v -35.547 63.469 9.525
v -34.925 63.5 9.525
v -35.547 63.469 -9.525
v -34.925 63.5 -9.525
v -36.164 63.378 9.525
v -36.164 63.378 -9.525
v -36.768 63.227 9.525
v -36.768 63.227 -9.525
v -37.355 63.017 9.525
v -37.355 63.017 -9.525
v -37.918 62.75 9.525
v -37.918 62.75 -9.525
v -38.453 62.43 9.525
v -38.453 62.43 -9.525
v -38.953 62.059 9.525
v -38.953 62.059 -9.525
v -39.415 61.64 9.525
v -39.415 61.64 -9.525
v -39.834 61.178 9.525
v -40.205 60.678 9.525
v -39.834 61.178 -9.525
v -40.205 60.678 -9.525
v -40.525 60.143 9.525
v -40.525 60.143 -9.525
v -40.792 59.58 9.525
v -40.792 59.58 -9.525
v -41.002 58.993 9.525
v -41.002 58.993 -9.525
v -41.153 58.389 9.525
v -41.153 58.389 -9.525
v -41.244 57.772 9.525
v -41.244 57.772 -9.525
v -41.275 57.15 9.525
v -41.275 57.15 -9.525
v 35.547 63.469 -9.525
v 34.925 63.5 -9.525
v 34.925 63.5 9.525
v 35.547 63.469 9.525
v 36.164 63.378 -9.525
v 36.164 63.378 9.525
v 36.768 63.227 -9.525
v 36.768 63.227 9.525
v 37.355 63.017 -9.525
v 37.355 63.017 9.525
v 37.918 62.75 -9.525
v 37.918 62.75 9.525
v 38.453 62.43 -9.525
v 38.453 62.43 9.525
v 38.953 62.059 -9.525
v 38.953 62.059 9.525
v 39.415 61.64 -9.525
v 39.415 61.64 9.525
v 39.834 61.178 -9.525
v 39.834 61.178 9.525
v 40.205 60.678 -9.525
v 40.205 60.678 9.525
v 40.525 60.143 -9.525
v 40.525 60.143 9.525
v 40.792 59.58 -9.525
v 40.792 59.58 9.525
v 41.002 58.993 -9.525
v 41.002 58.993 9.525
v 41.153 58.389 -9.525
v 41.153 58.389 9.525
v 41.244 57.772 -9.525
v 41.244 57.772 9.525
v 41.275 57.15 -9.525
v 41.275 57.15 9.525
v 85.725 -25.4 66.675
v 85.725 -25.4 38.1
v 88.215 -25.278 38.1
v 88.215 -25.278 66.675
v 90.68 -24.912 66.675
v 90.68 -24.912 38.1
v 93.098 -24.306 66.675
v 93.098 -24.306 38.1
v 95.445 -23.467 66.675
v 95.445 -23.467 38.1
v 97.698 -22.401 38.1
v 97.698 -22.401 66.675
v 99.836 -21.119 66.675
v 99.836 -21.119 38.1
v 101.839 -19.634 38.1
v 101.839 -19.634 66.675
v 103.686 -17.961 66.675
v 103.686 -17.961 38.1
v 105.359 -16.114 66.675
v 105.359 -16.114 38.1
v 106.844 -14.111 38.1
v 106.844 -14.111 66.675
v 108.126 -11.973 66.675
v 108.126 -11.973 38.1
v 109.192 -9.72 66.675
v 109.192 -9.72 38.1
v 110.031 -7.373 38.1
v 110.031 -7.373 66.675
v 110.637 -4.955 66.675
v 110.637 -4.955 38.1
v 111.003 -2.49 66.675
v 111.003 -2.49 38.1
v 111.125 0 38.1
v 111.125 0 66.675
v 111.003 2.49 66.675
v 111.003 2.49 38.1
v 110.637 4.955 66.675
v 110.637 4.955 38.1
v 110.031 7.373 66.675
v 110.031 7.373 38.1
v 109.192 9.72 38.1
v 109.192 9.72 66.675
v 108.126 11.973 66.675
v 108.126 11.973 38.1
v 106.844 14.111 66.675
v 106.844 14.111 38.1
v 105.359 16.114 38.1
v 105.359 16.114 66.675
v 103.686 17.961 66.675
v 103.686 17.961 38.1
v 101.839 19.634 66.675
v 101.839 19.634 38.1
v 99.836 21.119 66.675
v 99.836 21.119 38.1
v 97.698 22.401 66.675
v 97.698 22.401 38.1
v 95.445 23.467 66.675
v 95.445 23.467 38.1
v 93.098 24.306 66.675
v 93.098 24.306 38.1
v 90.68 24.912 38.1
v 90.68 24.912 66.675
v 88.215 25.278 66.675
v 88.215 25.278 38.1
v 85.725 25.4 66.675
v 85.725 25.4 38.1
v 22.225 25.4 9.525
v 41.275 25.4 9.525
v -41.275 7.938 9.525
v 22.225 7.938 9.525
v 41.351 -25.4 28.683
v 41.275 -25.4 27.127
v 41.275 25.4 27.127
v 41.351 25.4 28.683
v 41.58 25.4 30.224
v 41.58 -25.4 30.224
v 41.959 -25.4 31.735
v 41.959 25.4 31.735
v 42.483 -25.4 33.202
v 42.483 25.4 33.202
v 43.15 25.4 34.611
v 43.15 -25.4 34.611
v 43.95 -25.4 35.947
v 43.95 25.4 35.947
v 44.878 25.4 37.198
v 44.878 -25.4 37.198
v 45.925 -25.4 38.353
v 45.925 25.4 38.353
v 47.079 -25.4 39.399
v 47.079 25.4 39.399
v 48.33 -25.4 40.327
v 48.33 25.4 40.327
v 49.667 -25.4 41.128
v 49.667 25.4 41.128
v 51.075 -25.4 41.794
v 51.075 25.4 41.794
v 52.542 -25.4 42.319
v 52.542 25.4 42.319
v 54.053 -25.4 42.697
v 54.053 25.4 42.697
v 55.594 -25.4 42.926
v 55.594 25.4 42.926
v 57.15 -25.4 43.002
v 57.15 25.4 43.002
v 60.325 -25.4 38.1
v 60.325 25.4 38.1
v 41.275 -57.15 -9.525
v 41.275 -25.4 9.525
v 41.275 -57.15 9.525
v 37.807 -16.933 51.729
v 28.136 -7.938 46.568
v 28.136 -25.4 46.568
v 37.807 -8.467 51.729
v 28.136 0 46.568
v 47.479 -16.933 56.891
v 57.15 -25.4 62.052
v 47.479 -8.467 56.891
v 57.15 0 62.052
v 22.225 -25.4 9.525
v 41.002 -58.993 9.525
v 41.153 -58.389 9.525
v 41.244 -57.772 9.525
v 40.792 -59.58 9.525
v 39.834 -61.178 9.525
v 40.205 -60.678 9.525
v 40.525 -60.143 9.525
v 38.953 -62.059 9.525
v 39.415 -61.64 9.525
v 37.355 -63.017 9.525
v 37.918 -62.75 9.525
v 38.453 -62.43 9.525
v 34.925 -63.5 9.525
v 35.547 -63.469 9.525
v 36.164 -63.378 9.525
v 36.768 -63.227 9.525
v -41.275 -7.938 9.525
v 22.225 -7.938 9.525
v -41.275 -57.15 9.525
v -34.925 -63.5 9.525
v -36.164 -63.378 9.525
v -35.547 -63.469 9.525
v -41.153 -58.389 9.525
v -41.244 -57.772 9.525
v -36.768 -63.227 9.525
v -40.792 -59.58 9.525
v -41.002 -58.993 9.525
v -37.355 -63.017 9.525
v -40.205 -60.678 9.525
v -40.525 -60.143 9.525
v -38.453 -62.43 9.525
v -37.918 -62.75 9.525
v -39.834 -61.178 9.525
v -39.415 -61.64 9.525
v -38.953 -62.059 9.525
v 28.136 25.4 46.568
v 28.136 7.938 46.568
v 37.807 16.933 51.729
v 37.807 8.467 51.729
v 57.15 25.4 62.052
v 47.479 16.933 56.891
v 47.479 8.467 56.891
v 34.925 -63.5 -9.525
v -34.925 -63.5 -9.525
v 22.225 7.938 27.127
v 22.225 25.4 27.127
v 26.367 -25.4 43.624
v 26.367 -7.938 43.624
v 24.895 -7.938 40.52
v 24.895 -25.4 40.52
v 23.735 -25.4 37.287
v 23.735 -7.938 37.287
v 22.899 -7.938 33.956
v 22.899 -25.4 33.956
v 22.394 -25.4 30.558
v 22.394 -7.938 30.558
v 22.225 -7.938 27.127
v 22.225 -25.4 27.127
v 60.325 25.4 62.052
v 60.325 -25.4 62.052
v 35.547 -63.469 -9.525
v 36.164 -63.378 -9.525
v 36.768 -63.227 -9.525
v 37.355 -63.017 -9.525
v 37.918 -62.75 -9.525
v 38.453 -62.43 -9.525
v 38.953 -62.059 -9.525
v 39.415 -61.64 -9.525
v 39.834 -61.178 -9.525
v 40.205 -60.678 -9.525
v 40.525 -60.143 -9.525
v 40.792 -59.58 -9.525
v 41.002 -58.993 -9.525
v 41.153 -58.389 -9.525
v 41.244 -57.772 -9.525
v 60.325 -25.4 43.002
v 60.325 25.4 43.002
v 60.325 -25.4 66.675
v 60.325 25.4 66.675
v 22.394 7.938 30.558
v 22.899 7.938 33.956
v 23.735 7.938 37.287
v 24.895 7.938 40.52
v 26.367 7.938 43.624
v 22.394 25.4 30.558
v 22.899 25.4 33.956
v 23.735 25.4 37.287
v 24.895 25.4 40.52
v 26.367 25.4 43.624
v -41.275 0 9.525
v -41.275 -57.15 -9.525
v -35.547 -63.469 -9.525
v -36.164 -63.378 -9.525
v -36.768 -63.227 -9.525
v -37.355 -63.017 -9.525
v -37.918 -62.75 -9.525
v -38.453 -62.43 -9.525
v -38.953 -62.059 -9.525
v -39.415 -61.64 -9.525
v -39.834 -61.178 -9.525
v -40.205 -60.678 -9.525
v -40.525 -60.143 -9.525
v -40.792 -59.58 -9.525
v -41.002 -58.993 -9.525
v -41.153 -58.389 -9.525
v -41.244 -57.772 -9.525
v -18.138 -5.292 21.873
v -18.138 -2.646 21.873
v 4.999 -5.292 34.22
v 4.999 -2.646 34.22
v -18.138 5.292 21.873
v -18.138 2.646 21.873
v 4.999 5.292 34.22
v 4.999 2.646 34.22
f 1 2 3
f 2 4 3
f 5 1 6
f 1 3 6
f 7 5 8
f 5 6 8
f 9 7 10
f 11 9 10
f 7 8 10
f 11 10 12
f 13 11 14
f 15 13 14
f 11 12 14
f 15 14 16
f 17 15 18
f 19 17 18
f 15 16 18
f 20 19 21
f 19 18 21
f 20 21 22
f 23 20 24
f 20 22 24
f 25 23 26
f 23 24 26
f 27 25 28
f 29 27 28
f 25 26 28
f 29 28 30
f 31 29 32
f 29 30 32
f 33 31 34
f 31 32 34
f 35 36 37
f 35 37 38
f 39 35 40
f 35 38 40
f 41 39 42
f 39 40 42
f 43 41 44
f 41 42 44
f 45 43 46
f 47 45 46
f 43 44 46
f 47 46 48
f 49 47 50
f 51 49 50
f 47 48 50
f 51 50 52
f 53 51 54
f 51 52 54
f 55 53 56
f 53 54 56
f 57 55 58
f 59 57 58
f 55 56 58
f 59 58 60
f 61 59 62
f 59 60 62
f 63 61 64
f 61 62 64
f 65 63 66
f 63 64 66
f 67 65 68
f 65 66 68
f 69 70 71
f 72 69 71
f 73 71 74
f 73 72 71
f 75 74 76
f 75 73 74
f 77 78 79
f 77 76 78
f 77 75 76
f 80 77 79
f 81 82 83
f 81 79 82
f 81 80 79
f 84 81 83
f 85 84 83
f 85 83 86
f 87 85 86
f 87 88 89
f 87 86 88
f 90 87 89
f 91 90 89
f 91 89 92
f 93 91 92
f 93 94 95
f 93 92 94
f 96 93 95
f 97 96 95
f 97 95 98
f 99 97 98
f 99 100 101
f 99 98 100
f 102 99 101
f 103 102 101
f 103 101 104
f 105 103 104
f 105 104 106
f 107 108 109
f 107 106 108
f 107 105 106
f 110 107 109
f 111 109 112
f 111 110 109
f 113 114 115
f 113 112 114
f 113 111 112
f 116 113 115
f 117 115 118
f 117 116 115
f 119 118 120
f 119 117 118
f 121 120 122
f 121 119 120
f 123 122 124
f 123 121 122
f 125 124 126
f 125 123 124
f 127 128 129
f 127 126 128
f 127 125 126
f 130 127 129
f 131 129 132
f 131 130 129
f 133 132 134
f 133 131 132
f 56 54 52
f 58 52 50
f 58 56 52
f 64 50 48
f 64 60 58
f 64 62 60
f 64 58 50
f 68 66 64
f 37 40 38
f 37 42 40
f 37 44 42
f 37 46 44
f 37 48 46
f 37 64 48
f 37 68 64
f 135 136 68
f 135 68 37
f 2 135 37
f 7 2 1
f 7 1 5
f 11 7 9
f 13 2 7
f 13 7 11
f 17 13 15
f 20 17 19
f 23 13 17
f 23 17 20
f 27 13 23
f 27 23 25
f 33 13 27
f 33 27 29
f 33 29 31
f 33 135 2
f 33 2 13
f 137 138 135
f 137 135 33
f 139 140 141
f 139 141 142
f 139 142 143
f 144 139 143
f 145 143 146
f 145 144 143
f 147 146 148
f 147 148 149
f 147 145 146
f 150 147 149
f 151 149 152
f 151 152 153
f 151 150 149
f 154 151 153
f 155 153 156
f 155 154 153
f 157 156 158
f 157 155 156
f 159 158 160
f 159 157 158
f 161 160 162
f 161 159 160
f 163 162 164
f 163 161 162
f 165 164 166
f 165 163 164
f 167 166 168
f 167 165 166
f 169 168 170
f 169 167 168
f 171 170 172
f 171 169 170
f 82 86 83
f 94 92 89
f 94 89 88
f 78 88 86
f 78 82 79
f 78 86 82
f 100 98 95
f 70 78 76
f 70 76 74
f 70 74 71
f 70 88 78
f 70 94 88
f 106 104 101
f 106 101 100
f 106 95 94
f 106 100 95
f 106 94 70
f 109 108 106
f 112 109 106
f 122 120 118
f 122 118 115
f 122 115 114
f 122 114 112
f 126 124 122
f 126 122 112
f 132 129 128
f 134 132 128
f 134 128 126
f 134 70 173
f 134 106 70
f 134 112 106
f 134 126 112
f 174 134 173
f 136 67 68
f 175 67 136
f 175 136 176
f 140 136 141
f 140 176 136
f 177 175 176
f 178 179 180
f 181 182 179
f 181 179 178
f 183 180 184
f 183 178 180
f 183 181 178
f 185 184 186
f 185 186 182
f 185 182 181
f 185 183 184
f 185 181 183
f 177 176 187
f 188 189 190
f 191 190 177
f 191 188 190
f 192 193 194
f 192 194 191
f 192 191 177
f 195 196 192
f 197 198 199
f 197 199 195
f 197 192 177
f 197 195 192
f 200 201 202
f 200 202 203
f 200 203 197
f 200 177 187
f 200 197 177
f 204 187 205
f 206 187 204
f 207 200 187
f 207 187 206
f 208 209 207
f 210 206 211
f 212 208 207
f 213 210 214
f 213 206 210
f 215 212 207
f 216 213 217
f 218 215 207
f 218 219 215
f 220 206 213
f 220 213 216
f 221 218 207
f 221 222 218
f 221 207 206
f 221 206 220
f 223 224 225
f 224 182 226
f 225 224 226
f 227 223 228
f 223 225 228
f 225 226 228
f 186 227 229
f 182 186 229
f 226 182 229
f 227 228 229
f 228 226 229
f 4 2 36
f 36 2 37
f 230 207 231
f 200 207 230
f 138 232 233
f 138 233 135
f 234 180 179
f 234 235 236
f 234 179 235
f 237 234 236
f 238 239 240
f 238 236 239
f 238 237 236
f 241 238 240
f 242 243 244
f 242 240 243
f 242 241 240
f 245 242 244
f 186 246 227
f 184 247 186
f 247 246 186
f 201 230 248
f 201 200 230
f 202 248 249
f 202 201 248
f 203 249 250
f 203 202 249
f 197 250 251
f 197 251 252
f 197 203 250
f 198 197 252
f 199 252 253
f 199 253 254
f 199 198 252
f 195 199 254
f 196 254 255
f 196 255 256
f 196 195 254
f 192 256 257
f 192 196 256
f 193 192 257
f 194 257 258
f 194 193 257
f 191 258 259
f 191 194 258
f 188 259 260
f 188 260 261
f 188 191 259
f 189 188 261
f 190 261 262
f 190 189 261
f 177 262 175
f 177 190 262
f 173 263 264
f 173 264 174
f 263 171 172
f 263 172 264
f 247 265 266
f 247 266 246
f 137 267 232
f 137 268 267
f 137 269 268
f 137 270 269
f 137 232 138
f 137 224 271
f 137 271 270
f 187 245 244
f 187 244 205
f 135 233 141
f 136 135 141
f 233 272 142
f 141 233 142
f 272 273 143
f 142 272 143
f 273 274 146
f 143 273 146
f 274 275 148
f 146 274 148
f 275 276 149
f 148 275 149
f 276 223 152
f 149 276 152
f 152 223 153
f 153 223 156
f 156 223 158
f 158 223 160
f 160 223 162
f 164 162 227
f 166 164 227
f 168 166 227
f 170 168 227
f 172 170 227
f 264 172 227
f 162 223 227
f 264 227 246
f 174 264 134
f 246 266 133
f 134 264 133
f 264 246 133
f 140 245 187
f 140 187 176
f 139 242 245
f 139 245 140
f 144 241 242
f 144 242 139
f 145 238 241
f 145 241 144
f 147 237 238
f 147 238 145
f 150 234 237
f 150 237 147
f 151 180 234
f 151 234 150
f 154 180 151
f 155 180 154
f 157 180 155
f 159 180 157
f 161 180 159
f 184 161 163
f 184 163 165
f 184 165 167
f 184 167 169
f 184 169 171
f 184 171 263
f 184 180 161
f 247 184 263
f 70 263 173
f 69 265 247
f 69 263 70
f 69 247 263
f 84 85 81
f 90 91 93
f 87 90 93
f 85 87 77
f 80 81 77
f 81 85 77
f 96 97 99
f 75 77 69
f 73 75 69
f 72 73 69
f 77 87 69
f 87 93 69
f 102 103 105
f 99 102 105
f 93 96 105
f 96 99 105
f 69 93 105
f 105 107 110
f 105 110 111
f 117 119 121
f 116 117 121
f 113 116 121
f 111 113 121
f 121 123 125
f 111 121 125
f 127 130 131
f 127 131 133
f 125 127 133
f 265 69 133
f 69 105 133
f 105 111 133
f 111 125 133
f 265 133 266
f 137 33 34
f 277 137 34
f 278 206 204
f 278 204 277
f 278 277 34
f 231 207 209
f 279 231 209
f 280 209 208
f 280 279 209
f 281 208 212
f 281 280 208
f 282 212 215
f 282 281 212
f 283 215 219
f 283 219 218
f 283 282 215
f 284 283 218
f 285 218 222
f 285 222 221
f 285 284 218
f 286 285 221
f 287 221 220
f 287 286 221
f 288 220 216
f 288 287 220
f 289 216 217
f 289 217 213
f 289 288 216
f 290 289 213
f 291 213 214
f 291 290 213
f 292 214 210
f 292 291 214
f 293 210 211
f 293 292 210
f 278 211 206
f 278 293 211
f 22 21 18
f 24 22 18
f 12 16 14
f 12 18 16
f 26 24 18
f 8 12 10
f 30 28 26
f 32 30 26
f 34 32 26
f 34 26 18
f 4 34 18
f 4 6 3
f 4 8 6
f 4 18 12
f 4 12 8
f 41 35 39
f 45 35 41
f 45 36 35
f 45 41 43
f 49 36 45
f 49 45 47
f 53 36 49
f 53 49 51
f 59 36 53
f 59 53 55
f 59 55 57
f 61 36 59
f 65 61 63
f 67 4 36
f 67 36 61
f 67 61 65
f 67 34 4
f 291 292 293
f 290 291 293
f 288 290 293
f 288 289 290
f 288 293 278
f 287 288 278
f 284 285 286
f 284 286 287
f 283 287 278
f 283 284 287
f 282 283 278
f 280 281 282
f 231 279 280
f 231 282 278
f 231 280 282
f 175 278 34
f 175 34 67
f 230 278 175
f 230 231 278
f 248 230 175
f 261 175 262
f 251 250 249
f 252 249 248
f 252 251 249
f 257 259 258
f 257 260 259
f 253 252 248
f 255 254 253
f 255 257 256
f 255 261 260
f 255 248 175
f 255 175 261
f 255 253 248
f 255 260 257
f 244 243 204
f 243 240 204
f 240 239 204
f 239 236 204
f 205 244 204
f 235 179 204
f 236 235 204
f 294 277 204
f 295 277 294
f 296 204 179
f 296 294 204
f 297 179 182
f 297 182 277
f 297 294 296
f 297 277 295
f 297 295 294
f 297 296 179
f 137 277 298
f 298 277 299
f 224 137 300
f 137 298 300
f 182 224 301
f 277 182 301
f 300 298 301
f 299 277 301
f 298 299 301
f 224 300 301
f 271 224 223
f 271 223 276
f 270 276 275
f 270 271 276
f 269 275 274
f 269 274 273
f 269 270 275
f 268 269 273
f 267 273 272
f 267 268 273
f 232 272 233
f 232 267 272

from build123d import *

# Parameters (mm, degrees)
F1_DEPTH = 63.5
F2_DEPTH = 25.4
F3_DEPTH = 7.9375
F0_W     = 25.4
F0_H     = 28.575
F5_R     = 6.35


with BuildPart() as f1:
    # F0 (on Front) → F1 (new body, symmetric)
    with BuildSketch(Plane.XZ):
        Polygon((22.225, 9.525), (-41.275, 9.525), (-41.275, -9.525), (41.275, -9.525), (41.275, 9.525), align=None)
    extrude(amount=F1_DEPTH, both=True)

    # F0 (on Front) → F2 (join, symmetric)
    with BuildSketch(Plane.XZ):
        with BuildLine():
            Line((22.225, 27.1272), (22.225, 9.525))
            Line((22.225, 9.525), (41.275, 9.525))
            Line((41.275, 9.525), (41.275, 27.1272))
            ThreePointArc((41.275, 27.1272), (45.92468, 38.35252), (57.15, 43.0022))
            Line((57.15, 43.0022), (60.325, 43.0022))
            Line((60.325, 43.0022), (60.325, 62.0522))
            Line((60.325, 62.0522), (57.15, 62.0522))
            add(Edge.make_bspline(
                [(28.136121, 46.568148), (37.807414, 51.729499), (47.478707, 56.890849), (57.15, 62.0522)],
                knots=[78.677179, 78.677179, 78.677179, 78.677179, 111.564275, 111.564275, 111.564275, 111.564275], degree=3))
            ThreePointArc((28.136121, 46.568148), (23.735442, 37.28707), (22.225, 27.1272))
        make_face()
        Polygon((60.325, 66.675), (60.325, 62.0522), (60.325, 43.0022), (60.325, 38.1), (85.725, 38.1), (85.725, 66.675), align=None)
    extrude(amount=F2_DEPTH, both=True)

    # F0 (on Front) → F3 (join, symmetric)
    with BuildSketch(Plane.XZ):
        with BuildLine():
            add(Edge.make_bspline(
                [(-41.275, 9.525), (-18.13796, 21.872716), (4.999081, 34.220432), (28.136121, 46.568148)],
                knots=[0, 0, 0, 0, 78.677179, 78.677179, 78.677179, 78.677179], degree=3))
            Line((-41.275, 9.525), (22.225, 9.525))
            Line((22.225, 9.525), (22.225, 27.1272))
            ThreePointArc((22.225, 27.1272), (23.735442, 37.28707), (28.136121, 46.568148))
        make_face()
    extrude(amount=F3_DEPTH, both=True)

    # F0 (on Front) → F4 (revolve)
    with BuildSketch(Plane.XZ):
        with Locations((98.425, 52.3875)):
            Rectangle(F0_W, F0_H)
    revolve(axis=Axis((85.725, 0, 52.3875), (0, 0, 1)))

    # F5
    f5_edges = [f1.edges().sort_by_distance(p)[0] for p in [
        (41.275, -63.5, 0),
        (-41.275, -63.5, 0),
        (-41.275, 63.5, 0),
        (41.275, 63.5, 0),
    ]]
    fillet(f5_edges, radius=F5_R)


solid = f1.part
